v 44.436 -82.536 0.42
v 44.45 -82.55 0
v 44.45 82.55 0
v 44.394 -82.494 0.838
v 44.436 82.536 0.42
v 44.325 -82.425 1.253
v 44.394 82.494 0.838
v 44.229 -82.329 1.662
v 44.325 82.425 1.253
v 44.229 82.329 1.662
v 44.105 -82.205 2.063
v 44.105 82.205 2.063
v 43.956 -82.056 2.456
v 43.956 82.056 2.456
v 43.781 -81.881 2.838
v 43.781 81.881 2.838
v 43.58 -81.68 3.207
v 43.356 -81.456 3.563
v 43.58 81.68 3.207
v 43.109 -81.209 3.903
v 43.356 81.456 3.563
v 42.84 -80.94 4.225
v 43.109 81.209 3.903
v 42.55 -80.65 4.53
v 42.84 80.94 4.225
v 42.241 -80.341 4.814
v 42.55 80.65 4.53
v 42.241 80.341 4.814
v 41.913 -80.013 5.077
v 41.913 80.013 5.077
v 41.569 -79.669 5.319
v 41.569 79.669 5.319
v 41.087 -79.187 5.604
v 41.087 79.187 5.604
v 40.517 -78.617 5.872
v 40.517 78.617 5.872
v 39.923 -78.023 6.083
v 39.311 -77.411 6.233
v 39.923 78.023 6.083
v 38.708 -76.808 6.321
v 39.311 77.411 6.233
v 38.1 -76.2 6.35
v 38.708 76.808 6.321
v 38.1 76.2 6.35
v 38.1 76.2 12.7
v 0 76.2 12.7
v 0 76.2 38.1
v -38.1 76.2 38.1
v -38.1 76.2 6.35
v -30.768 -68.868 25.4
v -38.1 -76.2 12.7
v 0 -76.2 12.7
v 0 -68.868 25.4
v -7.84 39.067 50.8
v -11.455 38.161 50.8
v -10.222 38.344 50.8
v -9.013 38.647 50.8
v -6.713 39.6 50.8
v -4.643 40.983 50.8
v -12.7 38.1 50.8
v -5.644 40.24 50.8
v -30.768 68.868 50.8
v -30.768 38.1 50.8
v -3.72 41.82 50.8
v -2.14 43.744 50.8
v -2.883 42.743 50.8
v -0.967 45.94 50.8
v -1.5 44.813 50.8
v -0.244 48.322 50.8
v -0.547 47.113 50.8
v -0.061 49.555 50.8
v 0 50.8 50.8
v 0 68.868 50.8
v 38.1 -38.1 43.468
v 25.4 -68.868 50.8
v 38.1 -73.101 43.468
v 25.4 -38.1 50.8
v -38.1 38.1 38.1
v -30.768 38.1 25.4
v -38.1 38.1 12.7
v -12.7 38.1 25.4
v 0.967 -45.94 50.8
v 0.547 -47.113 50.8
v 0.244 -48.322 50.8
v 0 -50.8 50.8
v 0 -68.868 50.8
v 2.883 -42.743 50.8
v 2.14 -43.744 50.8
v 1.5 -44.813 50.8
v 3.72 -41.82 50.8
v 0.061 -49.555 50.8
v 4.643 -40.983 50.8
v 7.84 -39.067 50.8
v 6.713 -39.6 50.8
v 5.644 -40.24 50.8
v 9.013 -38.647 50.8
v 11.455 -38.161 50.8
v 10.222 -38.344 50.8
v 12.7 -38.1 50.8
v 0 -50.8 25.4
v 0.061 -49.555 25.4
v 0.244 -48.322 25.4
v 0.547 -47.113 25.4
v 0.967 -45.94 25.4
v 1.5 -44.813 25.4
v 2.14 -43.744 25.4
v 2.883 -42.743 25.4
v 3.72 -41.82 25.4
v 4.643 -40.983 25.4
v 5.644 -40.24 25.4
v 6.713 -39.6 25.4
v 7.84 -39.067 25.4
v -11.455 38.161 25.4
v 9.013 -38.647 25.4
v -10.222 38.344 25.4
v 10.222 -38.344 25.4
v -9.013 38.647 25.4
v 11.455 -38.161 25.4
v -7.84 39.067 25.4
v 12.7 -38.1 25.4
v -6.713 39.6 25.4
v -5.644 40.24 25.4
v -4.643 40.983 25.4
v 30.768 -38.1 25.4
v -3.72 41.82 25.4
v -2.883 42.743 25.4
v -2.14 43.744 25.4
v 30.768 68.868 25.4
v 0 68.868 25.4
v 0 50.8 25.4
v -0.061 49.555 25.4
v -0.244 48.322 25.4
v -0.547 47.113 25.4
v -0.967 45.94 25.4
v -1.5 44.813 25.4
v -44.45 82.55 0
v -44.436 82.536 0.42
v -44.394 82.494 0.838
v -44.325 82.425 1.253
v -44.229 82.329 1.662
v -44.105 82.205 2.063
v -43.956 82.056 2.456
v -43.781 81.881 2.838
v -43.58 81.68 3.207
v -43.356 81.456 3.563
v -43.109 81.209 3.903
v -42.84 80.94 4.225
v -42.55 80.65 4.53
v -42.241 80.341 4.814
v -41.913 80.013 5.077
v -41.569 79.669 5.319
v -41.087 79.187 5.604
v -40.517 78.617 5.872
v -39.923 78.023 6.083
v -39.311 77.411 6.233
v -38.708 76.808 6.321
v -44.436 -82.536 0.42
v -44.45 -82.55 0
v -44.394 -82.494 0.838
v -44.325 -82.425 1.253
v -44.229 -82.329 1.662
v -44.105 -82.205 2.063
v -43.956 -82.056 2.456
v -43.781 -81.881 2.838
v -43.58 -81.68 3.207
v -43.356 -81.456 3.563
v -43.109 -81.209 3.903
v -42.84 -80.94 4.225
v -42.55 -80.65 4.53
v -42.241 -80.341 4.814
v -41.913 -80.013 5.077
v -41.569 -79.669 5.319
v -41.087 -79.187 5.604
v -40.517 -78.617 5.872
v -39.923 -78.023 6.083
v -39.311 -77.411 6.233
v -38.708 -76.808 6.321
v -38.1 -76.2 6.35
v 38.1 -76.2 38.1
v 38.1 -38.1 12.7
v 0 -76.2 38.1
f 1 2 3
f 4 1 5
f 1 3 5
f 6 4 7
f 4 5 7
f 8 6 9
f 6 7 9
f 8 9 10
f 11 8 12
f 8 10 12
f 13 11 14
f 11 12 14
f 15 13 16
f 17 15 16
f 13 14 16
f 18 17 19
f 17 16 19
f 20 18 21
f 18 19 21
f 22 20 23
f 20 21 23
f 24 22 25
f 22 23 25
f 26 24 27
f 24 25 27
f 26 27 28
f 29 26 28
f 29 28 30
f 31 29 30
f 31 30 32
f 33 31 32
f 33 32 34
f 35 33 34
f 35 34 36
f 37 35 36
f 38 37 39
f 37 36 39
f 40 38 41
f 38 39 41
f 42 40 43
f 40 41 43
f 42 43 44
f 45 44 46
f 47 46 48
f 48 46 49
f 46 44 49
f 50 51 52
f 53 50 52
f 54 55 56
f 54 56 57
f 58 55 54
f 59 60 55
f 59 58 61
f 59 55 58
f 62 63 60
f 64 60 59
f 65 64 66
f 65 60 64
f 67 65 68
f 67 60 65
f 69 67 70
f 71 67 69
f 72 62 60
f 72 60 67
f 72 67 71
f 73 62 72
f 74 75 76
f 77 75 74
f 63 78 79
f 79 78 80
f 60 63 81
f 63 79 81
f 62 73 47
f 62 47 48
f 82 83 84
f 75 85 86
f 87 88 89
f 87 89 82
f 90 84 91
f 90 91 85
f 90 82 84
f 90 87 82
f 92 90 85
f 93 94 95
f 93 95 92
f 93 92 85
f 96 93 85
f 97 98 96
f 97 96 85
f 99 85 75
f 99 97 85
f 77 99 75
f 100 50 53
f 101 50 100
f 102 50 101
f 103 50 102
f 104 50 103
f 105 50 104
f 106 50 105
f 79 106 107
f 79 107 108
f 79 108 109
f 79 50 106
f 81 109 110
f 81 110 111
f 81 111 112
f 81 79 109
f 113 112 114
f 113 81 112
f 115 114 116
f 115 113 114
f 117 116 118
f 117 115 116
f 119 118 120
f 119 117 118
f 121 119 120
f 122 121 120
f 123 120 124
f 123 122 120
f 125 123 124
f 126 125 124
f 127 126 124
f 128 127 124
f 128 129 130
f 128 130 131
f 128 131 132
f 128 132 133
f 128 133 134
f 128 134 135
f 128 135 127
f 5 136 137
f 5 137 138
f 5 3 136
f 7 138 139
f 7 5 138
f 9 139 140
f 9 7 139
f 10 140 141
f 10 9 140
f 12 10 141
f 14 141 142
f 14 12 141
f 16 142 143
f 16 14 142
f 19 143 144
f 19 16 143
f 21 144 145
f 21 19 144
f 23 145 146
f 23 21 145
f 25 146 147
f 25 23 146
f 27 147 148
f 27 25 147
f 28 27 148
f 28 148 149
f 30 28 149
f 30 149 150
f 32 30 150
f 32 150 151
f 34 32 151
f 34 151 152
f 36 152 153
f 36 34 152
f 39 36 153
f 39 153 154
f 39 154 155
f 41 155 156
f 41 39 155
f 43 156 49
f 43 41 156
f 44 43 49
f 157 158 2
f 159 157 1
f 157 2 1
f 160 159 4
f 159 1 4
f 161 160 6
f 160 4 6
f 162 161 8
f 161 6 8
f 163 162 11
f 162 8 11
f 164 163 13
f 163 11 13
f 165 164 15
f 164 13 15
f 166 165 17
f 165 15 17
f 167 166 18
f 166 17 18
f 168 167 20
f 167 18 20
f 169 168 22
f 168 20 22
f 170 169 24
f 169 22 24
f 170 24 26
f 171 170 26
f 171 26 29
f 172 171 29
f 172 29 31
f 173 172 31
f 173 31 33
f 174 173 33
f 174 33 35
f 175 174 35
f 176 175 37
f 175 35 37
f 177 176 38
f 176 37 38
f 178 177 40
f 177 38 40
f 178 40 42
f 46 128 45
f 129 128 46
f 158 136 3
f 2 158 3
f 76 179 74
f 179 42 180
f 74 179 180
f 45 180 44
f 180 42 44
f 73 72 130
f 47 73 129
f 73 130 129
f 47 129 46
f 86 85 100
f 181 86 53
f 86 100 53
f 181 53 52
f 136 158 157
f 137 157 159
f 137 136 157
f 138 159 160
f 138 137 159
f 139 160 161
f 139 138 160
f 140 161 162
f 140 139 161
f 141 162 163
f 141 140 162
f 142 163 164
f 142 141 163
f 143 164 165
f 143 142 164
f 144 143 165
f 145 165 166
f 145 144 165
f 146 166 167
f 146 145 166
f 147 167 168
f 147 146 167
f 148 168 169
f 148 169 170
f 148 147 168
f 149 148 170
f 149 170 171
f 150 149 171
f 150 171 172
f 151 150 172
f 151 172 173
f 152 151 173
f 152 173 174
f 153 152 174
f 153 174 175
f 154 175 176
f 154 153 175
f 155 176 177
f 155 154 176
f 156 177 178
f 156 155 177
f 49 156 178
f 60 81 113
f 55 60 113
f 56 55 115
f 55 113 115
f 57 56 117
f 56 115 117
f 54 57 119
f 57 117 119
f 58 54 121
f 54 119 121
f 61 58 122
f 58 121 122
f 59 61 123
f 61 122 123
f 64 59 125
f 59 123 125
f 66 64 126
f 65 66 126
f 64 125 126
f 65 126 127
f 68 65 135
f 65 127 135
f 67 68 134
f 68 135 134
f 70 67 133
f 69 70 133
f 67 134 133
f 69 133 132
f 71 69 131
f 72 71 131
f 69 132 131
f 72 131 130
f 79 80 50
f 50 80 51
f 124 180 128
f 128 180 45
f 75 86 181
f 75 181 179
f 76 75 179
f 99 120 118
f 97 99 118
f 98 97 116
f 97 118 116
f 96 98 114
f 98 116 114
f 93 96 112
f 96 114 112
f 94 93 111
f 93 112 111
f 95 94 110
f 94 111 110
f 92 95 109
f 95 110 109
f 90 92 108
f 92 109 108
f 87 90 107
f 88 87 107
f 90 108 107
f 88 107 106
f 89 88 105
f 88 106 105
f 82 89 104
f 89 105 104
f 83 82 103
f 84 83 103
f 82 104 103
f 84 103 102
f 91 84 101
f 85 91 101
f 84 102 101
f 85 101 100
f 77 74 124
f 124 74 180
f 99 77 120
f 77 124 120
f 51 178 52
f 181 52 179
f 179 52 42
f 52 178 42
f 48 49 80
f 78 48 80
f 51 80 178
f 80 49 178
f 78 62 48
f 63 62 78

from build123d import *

# Parameters (mm, degrees)
F0_W        = 88.9
F0_H        = 165.1
F1_DEPTH    = 6.35
F2_R        = 6.34999
F3_DEPTH    = 25.4
F4_DEPTH    = 50.8
F5_C1_SIZE2 = 7.3323484187
F5_C1_SIZE  = 12.7
F5_C2_SIZE2 = 12.7
F5_C2_SIZE  = 7.3323484187
F5_C3_SIZE2 = 7.3323484187
F5_C3_SIZE  = 12.7
F5_C4_SIZE2 = 7.3323484187
F5_C4_SIZE  = 12.7
F6_C1_SIZE2 = 7.3323484187
F6_C1_SIZE  = 12.7
F6_C2_SIZE2 = 12.7
F6_C2_SIZE  = 7.3323484187
F6_C3_SIZE2 = 12.7
F6_C3_SIZE  = 7.3323484187
F6_C4_SIZE2 = 12.7
F6_C4_SIZE  = 7.3323484187


# Not quite as in the source:
# - a fillet or chamfer is up to 0.001 mm smaller than in the source, because OpenCascade refuses the exact size


with BuildPart() as f1:
    # F0 (on Top) → F1 (new body)
    with BuildSketch(Plane.XY):
        Rectangle(F0_W, F0_H)
        Polygon((-38.1, 38.1), (-38.1, 76.2), (0, 76.2), (38.1, 76.2), (38.1, -38.1), (38.1, -76.2), (0, -76.2), (-38.1, -76.2), align=None, mode=Mode.SUBTRACT)
    extrude(amount=F1_DEPTH)

    # F2 (radius 6.35 in the source; OpenCascade refuses exactly that, so slightly less here)
    f2_edges = [f1.edges().sort_by_distance(p)[0] for p in [
        (-44.45, 0, 6.35),
        (0, -82.55, 6.35),
        (44.45, 0, 6.35),
        (0, 82.55, 6.35),
    ]]
    fillet(f2_edges, radius=F2_R)

    # F0 (on Top) → F3 (join)
    with BuildSketch(Plane.XY):
        with BuildLine():
            Line((38.1, 76.2), (0, 76.2))
            Line((0, 76.2), (0, 50.8))
            ThreePointArc((0, 50.8), (-3.7197438789, 41.8197438789), (-12.7, 38.1))
            Line((-12.7, 38.1), (-38.1, 38.1))
            Line((-38.1, 38.1), (-38.1, -76.2))
            Line((-38.1, -76.2), (0, -76.2))
            Line((0, -76.2), (0, -50.8))
            ThreePointArc((0, -50.8), (3.7197438789, -41.8197438789), (12.7, -38.1))
            Line((12.7, -38.1), (38.1, -38.1))
            Line((38.1, -38.1), (38.1, 76.2))
        make_face()
    extrude(amount=F3_DEPTH)

    # F0 (on Top) → F4 (join)
    with BuildSketch(Plane.XY):
        with BuildLine():
            Line((38.1, -76.2), (38.1, -38.1))
            Line((38.1, -38.1), (12.7, -38.1))
            ThreePointArc((12.7, -38.1), (3.7197438789, -41.8197438789), (0, -50.8))
            Line((0, -50.8), (0, -76.2))
            Line((0, -76.2), (38.1, -76.2))
        make_face()
        with BuildLine():
            Line((0, 76.2), (-38.1, 76.2))
            Line((-38.1, 76.2), (-38.1, 38.1))
            Line((-38.1, 38.1), (-12.7, 38.1))
            ThreePointArc((-12.7, 38.1), (-3.7197438789, 41.8197438789), (0, 50.8))
            Line((0, 50.8), (0, 76.2))
        make_face()
    extrude(amount=F4_DEPTH)

    # F5: chamfer of 12.7 x 7.3323484187 on 4 edges, made by hand

    # F5_c1
    f5_c1_edges = [f1.edges().sort_by_distance(p)[0] for p in [
        (19.05, -76.2, 50.8),
    ]]
    f5_c1_side = f1.faces().sort_by_distance((19.05, -76.2, 50.6533530316))[0]
    chamfer(f5_c1_edges, length=F5_C1_SIZE, length2=F5_C1_SIZE2, reference=f5_c1_side)

    # F5_c2
    f5_c2_edges = [f1.edges().sort_by_distance(p)[0] for p in [
        (38.1, -53.4838257906, 50.8),
    ]]
    f5_c2_side = f1.faces().sort_by_distance((38.1, -53.4838257906, 50.6533530316))[0]
    chamfer(f5_c2_edges, length=F5_C2_SIZE, length2=F5_C2_SIZE2, reference=f5_c2_side)

    # F5_c3
    f5_c3_edges = [f1.edges().sort_by_distance(p)[0] for p in [
        (-19.05, 76.2, 50.8),
    ]]
    f5_c3_side = f1.faces().sort_by_distance((-19.05, 76.2, 50.6533530316))[0]
    chamfer(f5_c3_edges, length=F5_C3_SIZE, length2=F5_C3_SIZE2, reference=f5_c3_side)

    # F5_c4
    f5_c4_edges = [f1.edges().sort_by_distance(p)[0] for p in [
        (-38.1, 53.4838257906, 50.8),
    ]]
    f5_c4_side = f1.faces().sort_by_distance((-38.1, 53.4838257906, 50.6533530316))[0]
    chamfer(f5_c4_edges, length=F5_C4_SIZE, length2=F5_C4_SIZE2, reference=f5_c4_side)

    # F6: chamfer of 12.7 x 7.3323484187 on 4 edges, made by hand

    # F6_c1
    f6_c1_edges = [f1.edges().sort_by_distance(p)[0] for p in [
        (19.05, 76.2, 25.4),
    ]]
    f6_c1_side = f1.faces().sort_by_distance((19.05, 76.2, 25.2533530316))[0]
    chamfer(f6_c1_edges, length=F6_C1_SIZE, length2=F6_C1_SIZE2, reference=f6_c1_side)

    # F6_c2
    f6_c2_edges = [f1.edges().sort_by_distance(p)[0] for p in [
        (-38.1, -19.05, 25.4),
    ]]
    f6_c2_side = f1.faces().sort_by_distance((-37.9533530316, -19.05, 25.4))[0]
    chamfer(f6_c2_edges, length=F6_C2_SIZE, length2=F6_C2_SIZE2, reference=f6_c2_side)

    # F6_c3
    f6_c3_edges = [f1.edges().sort_by_distance(p)[0] for p in [
        (38.1, 15.3838257906, 25.4),
    ]]
    f6_c3_side = f1.faces().sort_by_distance((37.9533530316, 15.3838257906, 25.4))[0]
    chamfer(f6_c3_edges, length=F6_C3_SIZE, length2=F6_C3_SIZE2, reference=f6_c3_side)

    # F6_c4
    f6_c4_edges = [f1.edges().sort_by_distance(p)[0] for p in [
        (-15.3838257906, -76.2, 25.4),
    ]]
    f6_c4_side = f1.faces().sort_by_distance((-15.3838257906, -76.0533530316, 25.4))[0]
    chamfer(f6_c4_edges, length=F6_C4_SIZE, length2=F6_C4_SIZE2, reference=f6_c4_side)


solid = f1.part
